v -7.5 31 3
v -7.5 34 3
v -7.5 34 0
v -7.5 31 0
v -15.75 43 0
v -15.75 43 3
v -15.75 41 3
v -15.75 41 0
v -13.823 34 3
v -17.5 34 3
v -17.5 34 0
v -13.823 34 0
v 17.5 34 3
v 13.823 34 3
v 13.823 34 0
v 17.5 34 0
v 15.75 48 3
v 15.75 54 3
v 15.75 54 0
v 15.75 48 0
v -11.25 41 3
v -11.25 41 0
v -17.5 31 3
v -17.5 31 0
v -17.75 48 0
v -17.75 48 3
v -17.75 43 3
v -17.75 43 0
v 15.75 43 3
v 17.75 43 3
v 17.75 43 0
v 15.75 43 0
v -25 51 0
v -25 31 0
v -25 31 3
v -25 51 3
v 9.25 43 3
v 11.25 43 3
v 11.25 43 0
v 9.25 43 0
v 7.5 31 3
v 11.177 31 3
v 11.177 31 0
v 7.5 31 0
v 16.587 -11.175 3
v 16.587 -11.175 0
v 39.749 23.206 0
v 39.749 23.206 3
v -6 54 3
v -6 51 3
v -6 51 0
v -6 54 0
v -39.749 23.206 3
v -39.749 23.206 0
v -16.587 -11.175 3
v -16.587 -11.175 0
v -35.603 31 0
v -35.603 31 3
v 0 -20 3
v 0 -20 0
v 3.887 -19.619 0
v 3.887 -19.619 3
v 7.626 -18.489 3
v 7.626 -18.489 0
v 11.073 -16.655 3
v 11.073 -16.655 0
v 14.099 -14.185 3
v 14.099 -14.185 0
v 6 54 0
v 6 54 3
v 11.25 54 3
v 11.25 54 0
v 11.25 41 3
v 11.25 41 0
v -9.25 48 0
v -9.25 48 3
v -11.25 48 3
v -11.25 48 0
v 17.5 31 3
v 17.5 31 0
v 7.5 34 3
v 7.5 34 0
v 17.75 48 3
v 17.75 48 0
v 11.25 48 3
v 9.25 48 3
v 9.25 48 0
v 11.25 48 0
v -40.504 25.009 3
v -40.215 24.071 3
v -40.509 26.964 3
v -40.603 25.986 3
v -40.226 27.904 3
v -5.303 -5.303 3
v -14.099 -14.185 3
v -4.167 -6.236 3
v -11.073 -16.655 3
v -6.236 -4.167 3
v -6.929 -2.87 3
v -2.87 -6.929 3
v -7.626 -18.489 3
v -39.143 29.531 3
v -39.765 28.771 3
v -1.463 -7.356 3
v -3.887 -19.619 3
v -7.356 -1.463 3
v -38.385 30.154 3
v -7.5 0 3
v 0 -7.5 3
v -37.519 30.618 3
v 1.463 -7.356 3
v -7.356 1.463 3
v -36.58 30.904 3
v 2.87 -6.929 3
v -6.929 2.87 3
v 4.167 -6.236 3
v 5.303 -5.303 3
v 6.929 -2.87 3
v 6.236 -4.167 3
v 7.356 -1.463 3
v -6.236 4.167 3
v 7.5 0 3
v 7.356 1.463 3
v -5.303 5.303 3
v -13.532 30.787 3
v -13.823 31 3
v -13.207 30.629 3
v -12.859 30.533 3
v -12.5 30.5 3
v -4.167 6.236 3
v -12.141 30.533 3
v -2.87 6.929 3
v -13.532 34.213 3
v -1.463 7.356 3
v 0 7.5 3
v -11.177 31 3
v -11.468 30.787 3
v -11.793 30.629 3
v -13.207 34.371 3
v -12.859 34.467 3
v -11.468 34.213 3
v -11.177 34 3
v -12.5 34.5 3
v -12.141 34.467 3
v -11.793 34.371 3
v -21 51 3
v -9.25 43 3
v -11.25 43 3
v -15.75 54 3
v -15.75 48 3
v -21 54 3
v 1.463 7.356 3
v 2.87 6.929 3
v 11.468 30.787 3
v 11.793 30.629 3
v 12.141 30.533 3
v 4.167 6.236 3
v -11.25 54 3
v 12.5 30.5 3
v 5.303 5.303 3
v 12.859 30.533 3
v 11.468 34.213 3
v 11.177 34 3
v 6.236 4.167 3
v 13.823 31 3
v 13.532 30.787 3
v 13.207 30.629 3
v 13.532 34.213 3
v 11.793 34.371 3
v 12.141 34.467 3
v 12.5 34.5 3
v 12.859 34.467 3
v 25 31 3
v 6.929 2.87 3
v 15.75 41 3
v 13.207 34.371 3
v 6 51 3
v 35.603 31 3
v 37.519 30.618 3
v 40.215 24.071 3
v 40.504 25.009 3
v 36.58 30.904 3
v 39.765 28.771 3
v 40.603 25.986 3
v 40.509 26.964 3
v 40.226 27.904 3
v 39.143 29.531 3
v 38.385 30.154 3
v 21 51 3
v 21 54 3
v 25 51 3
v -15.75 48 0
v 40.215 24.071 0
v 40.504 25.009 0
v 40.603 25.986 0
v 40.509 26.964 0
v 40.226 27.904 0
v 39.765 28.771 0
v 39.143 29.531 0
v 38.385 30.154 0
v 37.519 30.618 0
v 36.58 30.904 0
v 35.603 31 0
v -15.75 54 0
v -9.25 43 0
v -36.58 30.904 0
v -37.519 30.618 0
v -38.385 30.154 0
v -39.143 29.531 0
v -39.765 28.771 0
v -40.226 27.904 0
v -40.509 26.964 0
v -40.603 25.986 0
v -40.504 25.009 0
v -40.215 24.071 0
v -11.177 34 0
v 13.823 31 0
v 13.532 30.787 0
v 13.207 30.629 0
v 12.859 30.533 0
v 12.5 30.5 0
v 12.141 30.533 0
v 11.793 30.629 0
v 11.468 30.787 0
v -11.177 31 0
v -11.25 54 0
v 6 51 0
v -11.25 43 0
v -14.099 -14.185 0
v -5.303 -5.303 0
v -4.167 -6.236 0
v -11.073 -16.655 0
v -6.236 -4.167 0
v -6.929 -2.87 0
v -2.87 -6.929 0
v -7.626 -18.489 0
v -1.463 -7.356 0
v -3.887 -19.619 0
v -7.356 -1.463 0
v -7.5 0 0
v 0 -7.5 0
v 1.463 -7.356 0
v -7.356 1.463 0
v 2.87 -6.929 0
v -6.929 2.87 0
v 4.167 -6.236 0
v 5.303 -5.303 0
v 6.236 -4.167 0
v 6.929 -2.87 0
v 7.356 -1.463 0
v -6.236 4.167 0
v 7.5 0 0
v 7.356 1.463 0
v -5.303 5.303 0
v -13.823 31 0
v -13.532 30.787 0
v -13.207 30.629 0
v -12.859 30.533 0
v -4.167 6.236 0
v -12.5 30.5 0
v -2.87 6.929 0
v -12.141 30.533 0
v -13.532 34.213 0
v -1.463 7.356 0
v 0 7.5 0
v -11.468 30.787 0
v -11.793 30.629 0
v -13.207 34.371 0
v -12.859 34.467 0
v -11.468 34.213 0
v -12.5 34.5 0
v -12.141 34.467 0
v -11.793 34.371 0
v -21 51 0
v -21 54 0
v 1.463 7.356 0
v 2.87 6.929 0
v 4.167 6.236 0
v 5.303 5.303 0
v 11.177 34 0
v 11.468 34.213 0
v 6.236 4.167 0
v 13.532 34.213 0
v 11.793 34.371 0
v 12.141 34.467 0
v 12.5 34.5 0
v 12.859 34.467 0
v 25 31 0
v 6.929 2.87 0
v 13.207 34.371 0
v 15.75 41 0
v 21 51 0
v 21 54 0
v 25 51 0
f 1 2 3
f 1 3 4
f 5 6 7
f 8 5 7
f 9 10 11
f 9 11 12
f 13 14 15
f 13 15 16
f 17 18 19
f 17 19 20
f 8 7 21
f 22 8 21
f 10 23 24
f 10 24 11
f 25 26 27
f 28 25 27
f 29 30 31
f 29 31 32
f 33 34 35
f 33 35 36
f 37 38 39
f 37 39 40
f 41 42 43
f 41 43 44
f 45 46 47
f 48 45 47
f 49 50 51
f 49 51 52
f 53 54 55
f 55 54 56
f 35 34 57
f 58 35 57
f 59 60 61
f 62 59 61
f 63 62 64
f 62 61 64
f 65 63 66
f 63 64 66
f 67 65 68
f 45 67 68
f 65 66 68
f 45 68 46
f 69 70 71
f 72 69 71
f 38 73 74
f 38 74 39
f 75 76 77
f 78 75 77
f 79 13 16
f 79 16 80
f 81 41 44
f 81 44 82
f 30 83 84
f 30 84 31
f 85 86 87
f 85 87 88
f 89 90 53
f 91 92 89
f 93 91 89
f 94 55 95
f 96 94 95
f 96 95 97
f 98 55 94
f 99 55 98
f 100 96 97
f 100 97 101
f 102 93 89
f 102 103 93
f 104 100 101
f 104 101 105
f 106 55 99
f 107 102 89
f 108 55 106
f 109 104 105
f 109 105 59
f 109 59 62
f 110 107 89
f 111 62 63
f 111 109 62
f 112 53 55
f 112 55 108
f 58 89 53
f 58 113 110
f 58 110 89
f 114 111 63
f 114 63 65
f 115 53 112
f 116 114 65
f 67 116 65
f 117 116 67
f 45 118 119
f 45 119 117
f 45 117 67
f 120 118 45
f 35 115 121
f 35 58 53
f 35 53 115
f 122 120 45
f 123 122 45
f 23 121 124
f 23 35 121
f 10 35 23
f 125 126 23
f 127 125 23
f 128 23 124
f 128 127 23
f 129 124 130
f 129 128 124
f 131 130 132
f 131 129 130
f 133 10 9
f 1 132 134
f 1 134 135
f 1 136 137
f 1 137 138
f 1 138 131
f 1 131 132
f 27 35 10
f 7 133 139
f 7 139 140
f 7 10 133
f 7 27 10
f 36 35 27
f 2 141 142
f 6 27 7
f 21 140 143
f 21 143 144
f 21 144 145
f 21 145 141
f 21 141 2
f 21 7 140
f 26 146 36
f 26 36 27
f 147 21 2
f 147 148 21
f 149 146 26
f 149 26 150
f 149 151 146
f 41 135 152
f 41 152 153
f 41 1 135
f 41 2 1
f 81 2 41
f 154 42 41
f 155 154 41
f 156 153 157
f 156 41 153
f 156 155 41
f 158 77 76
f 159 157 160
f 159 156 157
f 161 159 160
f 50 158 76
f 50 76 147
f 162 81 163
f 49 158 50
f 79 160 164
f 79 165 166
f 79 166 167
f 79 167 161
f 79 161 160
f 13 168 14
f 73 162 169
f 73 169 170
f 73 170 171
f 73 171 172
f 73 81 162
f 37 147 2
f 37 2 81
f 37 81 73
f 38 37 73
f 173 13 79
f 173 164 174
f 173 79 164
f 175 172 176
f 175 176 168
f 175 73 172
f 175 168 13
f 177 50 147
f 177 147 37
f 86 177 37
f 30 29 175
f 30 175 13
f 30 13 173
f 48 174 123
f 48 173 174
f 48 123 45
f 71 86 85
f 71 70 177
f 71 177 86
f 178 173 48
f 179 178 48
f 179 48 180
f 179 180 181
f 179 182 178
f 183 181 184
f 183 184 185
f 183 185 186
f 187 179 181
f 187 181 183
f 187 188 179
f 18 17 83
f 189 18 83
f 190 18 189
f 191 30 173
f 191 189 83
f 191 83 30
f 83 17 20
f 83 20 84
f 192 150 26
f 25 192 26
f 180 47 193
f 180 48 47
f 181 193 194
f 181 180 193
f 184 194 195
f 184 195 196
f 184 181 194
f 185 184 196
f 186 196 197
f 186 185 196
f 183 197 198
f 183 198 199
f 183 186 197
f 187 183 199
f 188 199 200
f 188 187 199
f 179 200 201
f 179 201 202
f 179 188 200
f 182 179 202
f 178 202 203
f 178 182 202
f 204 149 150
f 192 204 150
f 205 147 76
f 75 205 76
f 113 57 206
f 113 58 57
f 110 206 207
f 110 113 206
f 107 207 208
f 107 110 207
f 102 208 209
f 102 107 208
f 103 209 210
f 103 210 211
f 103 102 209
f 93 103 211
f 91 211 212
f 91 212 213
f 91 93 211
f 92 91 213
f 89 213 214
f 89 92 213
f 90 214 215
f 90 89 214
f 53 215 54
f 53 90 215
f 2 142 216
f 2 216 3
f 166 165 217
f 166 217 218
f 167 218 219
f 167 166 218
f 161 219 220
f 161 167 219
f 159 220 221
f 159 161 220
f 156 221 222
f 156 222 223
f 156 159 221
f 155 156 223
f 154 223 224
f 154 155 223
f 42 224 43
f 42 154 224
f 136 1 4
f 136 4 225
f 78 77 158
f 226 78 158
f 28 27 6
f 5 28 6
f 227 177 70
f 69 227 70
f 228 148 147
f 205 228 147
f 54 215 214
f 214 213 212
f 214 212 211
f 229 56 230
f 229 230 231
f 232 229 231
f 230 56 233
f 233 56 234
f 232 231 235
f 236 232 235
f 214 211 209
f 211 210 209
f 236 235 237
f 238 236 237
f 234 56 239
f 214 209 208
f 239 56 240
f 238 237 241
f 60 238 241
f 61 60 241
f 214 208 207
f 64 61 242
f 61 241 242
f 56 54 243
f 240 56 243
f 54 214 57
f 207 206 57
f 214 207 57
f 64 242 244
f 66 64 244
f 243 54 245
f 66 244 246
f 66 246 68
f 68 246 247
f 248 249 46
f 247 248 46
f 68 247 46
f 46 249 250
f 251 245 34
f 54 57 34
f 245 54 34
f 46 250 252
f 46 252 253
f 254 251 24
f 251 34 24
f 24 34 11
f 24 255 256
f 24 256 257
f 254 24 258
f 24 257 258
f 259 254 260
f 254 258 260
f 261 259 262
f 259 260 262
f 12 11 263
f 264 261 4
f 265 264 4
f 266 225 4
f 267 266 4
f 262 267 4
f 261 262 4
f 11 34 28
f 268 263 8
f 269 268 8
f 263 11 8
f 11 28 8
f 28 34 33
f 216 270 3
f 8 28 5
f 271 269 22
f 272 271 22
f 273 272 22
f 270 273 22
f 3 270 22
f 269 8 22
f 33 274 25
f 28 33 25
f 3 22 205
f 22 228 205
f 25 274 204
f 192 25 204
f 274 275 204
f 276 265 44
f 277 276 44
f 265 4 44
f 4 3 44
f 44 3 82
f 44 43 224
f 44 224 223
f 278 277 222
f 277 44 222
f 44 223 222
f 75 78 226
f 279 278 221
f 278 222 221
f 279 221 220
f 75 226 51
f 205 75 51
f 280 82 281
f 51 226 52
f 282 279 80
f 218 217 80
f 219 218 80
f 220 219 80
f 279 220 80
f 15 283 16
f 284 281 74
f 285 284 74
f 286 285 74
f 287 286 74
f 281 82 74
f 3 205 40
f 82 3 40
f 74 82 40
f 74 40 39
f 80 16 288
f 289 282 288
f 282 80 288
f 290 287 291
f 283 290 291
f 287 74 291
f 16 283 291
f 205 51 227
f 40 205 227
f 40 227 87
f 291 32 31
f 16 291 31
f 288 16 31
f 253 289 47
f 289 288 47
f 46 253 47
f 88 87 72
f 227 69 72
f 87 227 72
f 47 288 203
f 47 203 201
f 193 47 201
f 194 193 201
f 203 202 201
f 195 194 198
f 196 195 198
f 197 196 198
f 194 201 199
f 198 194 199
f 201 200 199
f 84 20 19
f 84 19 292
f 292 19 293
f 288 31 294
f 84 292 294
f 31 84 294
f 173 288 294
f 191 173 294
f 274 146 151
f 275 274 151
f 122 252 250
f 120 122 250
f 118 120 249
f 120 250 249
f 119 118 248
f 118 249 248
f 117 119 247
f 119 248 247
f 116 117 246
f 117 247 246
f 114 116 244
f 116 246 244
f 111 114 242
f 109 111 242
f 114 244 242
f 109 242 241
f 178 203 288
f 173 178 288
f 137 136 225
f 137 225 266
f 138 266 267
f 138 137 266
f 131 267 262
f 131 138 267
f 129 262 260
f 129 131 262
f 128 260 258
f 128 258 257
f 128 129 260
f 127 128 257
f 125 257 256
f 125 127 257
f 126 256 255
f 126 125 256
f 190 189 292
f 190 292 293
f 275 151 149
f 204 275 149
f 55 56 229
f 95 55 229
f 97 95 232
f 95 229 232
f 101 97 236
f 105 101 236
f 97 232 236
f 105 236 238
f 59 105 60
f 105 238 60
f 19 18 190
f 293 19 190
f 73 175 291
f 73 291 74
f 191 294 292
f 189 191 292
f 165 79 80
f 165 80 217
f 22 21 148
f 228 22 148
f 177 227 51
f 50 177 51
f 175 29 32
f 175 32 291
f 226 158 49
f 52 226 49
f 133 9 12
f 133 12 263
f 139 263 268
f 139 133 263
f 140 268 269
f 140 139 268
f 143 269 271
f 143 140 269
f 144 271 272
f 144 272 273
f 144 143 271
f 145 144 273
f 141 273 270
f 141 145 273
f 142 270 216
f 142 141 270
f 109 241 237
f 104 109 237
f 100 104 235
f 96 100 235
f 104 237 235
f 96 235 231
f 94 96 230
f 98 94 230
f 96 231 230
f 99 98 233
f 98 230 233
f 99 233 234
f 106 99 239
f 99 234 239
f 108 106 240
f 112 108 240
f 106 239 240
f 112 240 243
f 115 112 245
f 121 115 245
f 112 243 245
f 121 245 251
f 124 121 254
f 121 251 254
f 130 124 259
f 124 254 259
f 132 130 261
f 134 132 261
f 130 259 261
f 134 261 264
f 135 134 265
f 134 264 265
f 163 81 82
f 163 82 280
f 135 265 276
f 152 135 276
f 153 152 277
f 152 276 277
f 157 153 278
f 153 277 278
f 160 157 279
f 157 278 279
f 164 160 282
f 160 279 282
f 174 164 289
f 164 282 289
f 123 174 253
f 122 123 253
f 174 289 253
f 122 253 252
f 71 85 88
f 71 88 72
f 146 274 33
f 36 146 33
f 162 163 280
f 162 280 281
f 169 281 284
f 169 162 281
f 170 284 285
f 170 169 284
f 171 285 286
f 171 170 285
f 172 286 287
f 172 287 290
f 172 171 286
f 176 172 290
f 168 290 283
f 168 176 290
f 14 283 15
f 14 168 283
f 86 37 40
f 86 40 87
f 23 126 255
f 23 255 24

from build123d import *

# Parameters (mm, degrees)
SKETCH_1_W          = 25
SKETCH_1_H          = 20
EXTRUDE_1_DEPTH     = 3
FILLET_1_R          = 5
CUT_EXTRUDE_1_DEPTH = 3
SKETCH_3_W          = 15
SKETCH_3_H          = 3
EXTRUDE_2_DEPTH     = 3
CUT_EXTRUDE_2_DEPTH = 3


with BuildPart() as part:
    # 草图1 → 凸台-拉伸1 (new body)
    with BuildSketch(Plane.XY):
        with BuildLine():
            ThreePointArc((0, 20), (-17.656339801, 9.39434217), (-16.586969757, -11.174633519))
            ThreePointArc((-16.586969757, -11.174633519), (-9.39434217, -17.656339801), (0, -20))
            Line((0, -20), (0, -7.5))
            ThreePointArc((0, -7.5), (-7.5, 0), (0, 7.5))
            Line((0, 7.5), (0, 20))
        make_face()
        with BuildLine():
            ThreePointArc((20, 0), (14.142135624, 14.142135624), (0, 20))
            Line((0, 20), (0, 7.5))
            ThreePointArc((0, 7.5), (5.303300859, 5.303300859), (7.5, 0))
            ThreePointArc((7.5, 0), (5.303300859, -5.303300859), (0, -7.5))
            Line((0, -7.5), (0, -20))
            ThreePointArc((0, -20), (9.39434217, -17.656339801), (16.586969757, -11.174633519))
            ThreePointArc((16.586969757, -11.174633519), (19.127720658, -5.842114551), (20, 0))
        make_face()
        with BuildLine():
            Line((25, 31), (0, 31))
            Line((0, 31), (0, 20))
            ThreePointArc((0, 20), (14.142135624, 14.142135624), (20, 0))
            ThreePointArc((20, 0), (19.127720658, -5.842114551), (16.586969757, -11.174633519))
            Line((16.586969757, -11.174633519), (45, 31))
            Line((45, 31), (25, 31))
        make_face()
        with BuildLine():
            Line((-25, 31), (-45, 31))
            Line((-45, 31), (-16.586969757, -11.174633519))
            ThreePointArc((-16.586969757, -11.174633519), (-17.656339801, 9.39434217), (0, 20))
            Line((0, 20), (0, 31))
            Line((0, 31), (-25, 31))
        make_face()
        with Locations((-12.5, 41)):
            Rectangle(SKETCH_1_W, SKETCH_1_H)
        with Locations((12.5, 41)):
            Rectangle(SKETCH_1_W, SKETCH_1_H)
    extrude(amount=EXTRUDE_1_DEPTH)

    # 圆角1
    fillet_1_edges = [part.edges().sort_by_distance(p)[0] for p in [
        (45, 31, 1.5),
        (-45, 31, 1.5),
    ]]
    fillet(fillet_1_edges, radius=FILLET_1_R)

    # 草图2 → 切除-拉伸1 (cut)
    with BuildSketch(Plane.XY.offset(3)):
        with BuildLine():
            Line((-17.5, 34), (-13.822875656, 34))
            ThreePointArc((-13.822875656, 34), (-12.5, 34.5), (-11.177124344, 34))
            Line((-11.177124344, 34), (-7.5, 34))
            Line((-7.5, 34), (-7.5, 31))
            Line((-7.5, 31), (-11.177124344, 31))
            ThreePointArc((-11.177124344, 31), (-12.5, 30.5), (-13.822875656, 31))
            Line((-13.822875656, 31), (-17.5, 31))
            Line((-17.5, 31), (-17.5, 34))
        make_face()
        with BuildLine():
            Line((7.5, 34), (11.177124344, 34))
            ThreePointArc((11.177124344, 34), (12.5, 34.5), (13.822875656, 34))
            Line((13.822875656, 34), (17.5, 34))
            Line((17.5, 34), (17.5, 31))
            Line((17.5, 31), (13.822875656, 31))
            ThreePointArc((13.822875656, 31), (12.5, 30.5), (11.177124344, 31))
            Line((11.177124344, 31), (7.5, 31))
            Line((7.5, 31), (7.5, 34))
        make_face()
    extrude(amount=-CUT_EXTRUDE_1_DEPTH, mode=Mode.SUBTRACT)

    # 草图3 → 凸台-拉伸2 (add)
    with BuildSketch(Plane.XY.offset(3)):
        with Locations((-13.5, 52.5)):
            Rectangle(SKETCH_3_W, SKETCH_3_H)
        with Locations((13.5, 52.5)):
            Rectangle(SKETCH_3_W, SKETCH_3_H)
    extrude(amount=-EXTRUDE_2_DEPTH)

    # 草图4 → 切除-拉伸2 (cut)
    with BuildSketch(Plane.XY.offset(3)):
        Polygon((-15.75, 54), (-15.75, 48), (-17.75, 48), (-17.75, 43), (-15.75, 43), (-15.75, 41), (-11.25, 41), (-11.25, 43), (-9.25, 43), (-9.25, 48), (-11.25, 48), (-11.25, 54), align=None)
        Polygon((11.25, 48), (11.25, 54), (15.75, 54), (15.75, 48), (17.75, 48), (17.75, 43), (15.75, 43), (15.75, 41), (11.25, 41), (11.25, 43), (9.25, 43), (9.25, 48), align=None)
    extrude(amount=-CUT_EXTRUDE_2_DEPTH, mode=Mode.SUBTRACT)


solid = part.part
